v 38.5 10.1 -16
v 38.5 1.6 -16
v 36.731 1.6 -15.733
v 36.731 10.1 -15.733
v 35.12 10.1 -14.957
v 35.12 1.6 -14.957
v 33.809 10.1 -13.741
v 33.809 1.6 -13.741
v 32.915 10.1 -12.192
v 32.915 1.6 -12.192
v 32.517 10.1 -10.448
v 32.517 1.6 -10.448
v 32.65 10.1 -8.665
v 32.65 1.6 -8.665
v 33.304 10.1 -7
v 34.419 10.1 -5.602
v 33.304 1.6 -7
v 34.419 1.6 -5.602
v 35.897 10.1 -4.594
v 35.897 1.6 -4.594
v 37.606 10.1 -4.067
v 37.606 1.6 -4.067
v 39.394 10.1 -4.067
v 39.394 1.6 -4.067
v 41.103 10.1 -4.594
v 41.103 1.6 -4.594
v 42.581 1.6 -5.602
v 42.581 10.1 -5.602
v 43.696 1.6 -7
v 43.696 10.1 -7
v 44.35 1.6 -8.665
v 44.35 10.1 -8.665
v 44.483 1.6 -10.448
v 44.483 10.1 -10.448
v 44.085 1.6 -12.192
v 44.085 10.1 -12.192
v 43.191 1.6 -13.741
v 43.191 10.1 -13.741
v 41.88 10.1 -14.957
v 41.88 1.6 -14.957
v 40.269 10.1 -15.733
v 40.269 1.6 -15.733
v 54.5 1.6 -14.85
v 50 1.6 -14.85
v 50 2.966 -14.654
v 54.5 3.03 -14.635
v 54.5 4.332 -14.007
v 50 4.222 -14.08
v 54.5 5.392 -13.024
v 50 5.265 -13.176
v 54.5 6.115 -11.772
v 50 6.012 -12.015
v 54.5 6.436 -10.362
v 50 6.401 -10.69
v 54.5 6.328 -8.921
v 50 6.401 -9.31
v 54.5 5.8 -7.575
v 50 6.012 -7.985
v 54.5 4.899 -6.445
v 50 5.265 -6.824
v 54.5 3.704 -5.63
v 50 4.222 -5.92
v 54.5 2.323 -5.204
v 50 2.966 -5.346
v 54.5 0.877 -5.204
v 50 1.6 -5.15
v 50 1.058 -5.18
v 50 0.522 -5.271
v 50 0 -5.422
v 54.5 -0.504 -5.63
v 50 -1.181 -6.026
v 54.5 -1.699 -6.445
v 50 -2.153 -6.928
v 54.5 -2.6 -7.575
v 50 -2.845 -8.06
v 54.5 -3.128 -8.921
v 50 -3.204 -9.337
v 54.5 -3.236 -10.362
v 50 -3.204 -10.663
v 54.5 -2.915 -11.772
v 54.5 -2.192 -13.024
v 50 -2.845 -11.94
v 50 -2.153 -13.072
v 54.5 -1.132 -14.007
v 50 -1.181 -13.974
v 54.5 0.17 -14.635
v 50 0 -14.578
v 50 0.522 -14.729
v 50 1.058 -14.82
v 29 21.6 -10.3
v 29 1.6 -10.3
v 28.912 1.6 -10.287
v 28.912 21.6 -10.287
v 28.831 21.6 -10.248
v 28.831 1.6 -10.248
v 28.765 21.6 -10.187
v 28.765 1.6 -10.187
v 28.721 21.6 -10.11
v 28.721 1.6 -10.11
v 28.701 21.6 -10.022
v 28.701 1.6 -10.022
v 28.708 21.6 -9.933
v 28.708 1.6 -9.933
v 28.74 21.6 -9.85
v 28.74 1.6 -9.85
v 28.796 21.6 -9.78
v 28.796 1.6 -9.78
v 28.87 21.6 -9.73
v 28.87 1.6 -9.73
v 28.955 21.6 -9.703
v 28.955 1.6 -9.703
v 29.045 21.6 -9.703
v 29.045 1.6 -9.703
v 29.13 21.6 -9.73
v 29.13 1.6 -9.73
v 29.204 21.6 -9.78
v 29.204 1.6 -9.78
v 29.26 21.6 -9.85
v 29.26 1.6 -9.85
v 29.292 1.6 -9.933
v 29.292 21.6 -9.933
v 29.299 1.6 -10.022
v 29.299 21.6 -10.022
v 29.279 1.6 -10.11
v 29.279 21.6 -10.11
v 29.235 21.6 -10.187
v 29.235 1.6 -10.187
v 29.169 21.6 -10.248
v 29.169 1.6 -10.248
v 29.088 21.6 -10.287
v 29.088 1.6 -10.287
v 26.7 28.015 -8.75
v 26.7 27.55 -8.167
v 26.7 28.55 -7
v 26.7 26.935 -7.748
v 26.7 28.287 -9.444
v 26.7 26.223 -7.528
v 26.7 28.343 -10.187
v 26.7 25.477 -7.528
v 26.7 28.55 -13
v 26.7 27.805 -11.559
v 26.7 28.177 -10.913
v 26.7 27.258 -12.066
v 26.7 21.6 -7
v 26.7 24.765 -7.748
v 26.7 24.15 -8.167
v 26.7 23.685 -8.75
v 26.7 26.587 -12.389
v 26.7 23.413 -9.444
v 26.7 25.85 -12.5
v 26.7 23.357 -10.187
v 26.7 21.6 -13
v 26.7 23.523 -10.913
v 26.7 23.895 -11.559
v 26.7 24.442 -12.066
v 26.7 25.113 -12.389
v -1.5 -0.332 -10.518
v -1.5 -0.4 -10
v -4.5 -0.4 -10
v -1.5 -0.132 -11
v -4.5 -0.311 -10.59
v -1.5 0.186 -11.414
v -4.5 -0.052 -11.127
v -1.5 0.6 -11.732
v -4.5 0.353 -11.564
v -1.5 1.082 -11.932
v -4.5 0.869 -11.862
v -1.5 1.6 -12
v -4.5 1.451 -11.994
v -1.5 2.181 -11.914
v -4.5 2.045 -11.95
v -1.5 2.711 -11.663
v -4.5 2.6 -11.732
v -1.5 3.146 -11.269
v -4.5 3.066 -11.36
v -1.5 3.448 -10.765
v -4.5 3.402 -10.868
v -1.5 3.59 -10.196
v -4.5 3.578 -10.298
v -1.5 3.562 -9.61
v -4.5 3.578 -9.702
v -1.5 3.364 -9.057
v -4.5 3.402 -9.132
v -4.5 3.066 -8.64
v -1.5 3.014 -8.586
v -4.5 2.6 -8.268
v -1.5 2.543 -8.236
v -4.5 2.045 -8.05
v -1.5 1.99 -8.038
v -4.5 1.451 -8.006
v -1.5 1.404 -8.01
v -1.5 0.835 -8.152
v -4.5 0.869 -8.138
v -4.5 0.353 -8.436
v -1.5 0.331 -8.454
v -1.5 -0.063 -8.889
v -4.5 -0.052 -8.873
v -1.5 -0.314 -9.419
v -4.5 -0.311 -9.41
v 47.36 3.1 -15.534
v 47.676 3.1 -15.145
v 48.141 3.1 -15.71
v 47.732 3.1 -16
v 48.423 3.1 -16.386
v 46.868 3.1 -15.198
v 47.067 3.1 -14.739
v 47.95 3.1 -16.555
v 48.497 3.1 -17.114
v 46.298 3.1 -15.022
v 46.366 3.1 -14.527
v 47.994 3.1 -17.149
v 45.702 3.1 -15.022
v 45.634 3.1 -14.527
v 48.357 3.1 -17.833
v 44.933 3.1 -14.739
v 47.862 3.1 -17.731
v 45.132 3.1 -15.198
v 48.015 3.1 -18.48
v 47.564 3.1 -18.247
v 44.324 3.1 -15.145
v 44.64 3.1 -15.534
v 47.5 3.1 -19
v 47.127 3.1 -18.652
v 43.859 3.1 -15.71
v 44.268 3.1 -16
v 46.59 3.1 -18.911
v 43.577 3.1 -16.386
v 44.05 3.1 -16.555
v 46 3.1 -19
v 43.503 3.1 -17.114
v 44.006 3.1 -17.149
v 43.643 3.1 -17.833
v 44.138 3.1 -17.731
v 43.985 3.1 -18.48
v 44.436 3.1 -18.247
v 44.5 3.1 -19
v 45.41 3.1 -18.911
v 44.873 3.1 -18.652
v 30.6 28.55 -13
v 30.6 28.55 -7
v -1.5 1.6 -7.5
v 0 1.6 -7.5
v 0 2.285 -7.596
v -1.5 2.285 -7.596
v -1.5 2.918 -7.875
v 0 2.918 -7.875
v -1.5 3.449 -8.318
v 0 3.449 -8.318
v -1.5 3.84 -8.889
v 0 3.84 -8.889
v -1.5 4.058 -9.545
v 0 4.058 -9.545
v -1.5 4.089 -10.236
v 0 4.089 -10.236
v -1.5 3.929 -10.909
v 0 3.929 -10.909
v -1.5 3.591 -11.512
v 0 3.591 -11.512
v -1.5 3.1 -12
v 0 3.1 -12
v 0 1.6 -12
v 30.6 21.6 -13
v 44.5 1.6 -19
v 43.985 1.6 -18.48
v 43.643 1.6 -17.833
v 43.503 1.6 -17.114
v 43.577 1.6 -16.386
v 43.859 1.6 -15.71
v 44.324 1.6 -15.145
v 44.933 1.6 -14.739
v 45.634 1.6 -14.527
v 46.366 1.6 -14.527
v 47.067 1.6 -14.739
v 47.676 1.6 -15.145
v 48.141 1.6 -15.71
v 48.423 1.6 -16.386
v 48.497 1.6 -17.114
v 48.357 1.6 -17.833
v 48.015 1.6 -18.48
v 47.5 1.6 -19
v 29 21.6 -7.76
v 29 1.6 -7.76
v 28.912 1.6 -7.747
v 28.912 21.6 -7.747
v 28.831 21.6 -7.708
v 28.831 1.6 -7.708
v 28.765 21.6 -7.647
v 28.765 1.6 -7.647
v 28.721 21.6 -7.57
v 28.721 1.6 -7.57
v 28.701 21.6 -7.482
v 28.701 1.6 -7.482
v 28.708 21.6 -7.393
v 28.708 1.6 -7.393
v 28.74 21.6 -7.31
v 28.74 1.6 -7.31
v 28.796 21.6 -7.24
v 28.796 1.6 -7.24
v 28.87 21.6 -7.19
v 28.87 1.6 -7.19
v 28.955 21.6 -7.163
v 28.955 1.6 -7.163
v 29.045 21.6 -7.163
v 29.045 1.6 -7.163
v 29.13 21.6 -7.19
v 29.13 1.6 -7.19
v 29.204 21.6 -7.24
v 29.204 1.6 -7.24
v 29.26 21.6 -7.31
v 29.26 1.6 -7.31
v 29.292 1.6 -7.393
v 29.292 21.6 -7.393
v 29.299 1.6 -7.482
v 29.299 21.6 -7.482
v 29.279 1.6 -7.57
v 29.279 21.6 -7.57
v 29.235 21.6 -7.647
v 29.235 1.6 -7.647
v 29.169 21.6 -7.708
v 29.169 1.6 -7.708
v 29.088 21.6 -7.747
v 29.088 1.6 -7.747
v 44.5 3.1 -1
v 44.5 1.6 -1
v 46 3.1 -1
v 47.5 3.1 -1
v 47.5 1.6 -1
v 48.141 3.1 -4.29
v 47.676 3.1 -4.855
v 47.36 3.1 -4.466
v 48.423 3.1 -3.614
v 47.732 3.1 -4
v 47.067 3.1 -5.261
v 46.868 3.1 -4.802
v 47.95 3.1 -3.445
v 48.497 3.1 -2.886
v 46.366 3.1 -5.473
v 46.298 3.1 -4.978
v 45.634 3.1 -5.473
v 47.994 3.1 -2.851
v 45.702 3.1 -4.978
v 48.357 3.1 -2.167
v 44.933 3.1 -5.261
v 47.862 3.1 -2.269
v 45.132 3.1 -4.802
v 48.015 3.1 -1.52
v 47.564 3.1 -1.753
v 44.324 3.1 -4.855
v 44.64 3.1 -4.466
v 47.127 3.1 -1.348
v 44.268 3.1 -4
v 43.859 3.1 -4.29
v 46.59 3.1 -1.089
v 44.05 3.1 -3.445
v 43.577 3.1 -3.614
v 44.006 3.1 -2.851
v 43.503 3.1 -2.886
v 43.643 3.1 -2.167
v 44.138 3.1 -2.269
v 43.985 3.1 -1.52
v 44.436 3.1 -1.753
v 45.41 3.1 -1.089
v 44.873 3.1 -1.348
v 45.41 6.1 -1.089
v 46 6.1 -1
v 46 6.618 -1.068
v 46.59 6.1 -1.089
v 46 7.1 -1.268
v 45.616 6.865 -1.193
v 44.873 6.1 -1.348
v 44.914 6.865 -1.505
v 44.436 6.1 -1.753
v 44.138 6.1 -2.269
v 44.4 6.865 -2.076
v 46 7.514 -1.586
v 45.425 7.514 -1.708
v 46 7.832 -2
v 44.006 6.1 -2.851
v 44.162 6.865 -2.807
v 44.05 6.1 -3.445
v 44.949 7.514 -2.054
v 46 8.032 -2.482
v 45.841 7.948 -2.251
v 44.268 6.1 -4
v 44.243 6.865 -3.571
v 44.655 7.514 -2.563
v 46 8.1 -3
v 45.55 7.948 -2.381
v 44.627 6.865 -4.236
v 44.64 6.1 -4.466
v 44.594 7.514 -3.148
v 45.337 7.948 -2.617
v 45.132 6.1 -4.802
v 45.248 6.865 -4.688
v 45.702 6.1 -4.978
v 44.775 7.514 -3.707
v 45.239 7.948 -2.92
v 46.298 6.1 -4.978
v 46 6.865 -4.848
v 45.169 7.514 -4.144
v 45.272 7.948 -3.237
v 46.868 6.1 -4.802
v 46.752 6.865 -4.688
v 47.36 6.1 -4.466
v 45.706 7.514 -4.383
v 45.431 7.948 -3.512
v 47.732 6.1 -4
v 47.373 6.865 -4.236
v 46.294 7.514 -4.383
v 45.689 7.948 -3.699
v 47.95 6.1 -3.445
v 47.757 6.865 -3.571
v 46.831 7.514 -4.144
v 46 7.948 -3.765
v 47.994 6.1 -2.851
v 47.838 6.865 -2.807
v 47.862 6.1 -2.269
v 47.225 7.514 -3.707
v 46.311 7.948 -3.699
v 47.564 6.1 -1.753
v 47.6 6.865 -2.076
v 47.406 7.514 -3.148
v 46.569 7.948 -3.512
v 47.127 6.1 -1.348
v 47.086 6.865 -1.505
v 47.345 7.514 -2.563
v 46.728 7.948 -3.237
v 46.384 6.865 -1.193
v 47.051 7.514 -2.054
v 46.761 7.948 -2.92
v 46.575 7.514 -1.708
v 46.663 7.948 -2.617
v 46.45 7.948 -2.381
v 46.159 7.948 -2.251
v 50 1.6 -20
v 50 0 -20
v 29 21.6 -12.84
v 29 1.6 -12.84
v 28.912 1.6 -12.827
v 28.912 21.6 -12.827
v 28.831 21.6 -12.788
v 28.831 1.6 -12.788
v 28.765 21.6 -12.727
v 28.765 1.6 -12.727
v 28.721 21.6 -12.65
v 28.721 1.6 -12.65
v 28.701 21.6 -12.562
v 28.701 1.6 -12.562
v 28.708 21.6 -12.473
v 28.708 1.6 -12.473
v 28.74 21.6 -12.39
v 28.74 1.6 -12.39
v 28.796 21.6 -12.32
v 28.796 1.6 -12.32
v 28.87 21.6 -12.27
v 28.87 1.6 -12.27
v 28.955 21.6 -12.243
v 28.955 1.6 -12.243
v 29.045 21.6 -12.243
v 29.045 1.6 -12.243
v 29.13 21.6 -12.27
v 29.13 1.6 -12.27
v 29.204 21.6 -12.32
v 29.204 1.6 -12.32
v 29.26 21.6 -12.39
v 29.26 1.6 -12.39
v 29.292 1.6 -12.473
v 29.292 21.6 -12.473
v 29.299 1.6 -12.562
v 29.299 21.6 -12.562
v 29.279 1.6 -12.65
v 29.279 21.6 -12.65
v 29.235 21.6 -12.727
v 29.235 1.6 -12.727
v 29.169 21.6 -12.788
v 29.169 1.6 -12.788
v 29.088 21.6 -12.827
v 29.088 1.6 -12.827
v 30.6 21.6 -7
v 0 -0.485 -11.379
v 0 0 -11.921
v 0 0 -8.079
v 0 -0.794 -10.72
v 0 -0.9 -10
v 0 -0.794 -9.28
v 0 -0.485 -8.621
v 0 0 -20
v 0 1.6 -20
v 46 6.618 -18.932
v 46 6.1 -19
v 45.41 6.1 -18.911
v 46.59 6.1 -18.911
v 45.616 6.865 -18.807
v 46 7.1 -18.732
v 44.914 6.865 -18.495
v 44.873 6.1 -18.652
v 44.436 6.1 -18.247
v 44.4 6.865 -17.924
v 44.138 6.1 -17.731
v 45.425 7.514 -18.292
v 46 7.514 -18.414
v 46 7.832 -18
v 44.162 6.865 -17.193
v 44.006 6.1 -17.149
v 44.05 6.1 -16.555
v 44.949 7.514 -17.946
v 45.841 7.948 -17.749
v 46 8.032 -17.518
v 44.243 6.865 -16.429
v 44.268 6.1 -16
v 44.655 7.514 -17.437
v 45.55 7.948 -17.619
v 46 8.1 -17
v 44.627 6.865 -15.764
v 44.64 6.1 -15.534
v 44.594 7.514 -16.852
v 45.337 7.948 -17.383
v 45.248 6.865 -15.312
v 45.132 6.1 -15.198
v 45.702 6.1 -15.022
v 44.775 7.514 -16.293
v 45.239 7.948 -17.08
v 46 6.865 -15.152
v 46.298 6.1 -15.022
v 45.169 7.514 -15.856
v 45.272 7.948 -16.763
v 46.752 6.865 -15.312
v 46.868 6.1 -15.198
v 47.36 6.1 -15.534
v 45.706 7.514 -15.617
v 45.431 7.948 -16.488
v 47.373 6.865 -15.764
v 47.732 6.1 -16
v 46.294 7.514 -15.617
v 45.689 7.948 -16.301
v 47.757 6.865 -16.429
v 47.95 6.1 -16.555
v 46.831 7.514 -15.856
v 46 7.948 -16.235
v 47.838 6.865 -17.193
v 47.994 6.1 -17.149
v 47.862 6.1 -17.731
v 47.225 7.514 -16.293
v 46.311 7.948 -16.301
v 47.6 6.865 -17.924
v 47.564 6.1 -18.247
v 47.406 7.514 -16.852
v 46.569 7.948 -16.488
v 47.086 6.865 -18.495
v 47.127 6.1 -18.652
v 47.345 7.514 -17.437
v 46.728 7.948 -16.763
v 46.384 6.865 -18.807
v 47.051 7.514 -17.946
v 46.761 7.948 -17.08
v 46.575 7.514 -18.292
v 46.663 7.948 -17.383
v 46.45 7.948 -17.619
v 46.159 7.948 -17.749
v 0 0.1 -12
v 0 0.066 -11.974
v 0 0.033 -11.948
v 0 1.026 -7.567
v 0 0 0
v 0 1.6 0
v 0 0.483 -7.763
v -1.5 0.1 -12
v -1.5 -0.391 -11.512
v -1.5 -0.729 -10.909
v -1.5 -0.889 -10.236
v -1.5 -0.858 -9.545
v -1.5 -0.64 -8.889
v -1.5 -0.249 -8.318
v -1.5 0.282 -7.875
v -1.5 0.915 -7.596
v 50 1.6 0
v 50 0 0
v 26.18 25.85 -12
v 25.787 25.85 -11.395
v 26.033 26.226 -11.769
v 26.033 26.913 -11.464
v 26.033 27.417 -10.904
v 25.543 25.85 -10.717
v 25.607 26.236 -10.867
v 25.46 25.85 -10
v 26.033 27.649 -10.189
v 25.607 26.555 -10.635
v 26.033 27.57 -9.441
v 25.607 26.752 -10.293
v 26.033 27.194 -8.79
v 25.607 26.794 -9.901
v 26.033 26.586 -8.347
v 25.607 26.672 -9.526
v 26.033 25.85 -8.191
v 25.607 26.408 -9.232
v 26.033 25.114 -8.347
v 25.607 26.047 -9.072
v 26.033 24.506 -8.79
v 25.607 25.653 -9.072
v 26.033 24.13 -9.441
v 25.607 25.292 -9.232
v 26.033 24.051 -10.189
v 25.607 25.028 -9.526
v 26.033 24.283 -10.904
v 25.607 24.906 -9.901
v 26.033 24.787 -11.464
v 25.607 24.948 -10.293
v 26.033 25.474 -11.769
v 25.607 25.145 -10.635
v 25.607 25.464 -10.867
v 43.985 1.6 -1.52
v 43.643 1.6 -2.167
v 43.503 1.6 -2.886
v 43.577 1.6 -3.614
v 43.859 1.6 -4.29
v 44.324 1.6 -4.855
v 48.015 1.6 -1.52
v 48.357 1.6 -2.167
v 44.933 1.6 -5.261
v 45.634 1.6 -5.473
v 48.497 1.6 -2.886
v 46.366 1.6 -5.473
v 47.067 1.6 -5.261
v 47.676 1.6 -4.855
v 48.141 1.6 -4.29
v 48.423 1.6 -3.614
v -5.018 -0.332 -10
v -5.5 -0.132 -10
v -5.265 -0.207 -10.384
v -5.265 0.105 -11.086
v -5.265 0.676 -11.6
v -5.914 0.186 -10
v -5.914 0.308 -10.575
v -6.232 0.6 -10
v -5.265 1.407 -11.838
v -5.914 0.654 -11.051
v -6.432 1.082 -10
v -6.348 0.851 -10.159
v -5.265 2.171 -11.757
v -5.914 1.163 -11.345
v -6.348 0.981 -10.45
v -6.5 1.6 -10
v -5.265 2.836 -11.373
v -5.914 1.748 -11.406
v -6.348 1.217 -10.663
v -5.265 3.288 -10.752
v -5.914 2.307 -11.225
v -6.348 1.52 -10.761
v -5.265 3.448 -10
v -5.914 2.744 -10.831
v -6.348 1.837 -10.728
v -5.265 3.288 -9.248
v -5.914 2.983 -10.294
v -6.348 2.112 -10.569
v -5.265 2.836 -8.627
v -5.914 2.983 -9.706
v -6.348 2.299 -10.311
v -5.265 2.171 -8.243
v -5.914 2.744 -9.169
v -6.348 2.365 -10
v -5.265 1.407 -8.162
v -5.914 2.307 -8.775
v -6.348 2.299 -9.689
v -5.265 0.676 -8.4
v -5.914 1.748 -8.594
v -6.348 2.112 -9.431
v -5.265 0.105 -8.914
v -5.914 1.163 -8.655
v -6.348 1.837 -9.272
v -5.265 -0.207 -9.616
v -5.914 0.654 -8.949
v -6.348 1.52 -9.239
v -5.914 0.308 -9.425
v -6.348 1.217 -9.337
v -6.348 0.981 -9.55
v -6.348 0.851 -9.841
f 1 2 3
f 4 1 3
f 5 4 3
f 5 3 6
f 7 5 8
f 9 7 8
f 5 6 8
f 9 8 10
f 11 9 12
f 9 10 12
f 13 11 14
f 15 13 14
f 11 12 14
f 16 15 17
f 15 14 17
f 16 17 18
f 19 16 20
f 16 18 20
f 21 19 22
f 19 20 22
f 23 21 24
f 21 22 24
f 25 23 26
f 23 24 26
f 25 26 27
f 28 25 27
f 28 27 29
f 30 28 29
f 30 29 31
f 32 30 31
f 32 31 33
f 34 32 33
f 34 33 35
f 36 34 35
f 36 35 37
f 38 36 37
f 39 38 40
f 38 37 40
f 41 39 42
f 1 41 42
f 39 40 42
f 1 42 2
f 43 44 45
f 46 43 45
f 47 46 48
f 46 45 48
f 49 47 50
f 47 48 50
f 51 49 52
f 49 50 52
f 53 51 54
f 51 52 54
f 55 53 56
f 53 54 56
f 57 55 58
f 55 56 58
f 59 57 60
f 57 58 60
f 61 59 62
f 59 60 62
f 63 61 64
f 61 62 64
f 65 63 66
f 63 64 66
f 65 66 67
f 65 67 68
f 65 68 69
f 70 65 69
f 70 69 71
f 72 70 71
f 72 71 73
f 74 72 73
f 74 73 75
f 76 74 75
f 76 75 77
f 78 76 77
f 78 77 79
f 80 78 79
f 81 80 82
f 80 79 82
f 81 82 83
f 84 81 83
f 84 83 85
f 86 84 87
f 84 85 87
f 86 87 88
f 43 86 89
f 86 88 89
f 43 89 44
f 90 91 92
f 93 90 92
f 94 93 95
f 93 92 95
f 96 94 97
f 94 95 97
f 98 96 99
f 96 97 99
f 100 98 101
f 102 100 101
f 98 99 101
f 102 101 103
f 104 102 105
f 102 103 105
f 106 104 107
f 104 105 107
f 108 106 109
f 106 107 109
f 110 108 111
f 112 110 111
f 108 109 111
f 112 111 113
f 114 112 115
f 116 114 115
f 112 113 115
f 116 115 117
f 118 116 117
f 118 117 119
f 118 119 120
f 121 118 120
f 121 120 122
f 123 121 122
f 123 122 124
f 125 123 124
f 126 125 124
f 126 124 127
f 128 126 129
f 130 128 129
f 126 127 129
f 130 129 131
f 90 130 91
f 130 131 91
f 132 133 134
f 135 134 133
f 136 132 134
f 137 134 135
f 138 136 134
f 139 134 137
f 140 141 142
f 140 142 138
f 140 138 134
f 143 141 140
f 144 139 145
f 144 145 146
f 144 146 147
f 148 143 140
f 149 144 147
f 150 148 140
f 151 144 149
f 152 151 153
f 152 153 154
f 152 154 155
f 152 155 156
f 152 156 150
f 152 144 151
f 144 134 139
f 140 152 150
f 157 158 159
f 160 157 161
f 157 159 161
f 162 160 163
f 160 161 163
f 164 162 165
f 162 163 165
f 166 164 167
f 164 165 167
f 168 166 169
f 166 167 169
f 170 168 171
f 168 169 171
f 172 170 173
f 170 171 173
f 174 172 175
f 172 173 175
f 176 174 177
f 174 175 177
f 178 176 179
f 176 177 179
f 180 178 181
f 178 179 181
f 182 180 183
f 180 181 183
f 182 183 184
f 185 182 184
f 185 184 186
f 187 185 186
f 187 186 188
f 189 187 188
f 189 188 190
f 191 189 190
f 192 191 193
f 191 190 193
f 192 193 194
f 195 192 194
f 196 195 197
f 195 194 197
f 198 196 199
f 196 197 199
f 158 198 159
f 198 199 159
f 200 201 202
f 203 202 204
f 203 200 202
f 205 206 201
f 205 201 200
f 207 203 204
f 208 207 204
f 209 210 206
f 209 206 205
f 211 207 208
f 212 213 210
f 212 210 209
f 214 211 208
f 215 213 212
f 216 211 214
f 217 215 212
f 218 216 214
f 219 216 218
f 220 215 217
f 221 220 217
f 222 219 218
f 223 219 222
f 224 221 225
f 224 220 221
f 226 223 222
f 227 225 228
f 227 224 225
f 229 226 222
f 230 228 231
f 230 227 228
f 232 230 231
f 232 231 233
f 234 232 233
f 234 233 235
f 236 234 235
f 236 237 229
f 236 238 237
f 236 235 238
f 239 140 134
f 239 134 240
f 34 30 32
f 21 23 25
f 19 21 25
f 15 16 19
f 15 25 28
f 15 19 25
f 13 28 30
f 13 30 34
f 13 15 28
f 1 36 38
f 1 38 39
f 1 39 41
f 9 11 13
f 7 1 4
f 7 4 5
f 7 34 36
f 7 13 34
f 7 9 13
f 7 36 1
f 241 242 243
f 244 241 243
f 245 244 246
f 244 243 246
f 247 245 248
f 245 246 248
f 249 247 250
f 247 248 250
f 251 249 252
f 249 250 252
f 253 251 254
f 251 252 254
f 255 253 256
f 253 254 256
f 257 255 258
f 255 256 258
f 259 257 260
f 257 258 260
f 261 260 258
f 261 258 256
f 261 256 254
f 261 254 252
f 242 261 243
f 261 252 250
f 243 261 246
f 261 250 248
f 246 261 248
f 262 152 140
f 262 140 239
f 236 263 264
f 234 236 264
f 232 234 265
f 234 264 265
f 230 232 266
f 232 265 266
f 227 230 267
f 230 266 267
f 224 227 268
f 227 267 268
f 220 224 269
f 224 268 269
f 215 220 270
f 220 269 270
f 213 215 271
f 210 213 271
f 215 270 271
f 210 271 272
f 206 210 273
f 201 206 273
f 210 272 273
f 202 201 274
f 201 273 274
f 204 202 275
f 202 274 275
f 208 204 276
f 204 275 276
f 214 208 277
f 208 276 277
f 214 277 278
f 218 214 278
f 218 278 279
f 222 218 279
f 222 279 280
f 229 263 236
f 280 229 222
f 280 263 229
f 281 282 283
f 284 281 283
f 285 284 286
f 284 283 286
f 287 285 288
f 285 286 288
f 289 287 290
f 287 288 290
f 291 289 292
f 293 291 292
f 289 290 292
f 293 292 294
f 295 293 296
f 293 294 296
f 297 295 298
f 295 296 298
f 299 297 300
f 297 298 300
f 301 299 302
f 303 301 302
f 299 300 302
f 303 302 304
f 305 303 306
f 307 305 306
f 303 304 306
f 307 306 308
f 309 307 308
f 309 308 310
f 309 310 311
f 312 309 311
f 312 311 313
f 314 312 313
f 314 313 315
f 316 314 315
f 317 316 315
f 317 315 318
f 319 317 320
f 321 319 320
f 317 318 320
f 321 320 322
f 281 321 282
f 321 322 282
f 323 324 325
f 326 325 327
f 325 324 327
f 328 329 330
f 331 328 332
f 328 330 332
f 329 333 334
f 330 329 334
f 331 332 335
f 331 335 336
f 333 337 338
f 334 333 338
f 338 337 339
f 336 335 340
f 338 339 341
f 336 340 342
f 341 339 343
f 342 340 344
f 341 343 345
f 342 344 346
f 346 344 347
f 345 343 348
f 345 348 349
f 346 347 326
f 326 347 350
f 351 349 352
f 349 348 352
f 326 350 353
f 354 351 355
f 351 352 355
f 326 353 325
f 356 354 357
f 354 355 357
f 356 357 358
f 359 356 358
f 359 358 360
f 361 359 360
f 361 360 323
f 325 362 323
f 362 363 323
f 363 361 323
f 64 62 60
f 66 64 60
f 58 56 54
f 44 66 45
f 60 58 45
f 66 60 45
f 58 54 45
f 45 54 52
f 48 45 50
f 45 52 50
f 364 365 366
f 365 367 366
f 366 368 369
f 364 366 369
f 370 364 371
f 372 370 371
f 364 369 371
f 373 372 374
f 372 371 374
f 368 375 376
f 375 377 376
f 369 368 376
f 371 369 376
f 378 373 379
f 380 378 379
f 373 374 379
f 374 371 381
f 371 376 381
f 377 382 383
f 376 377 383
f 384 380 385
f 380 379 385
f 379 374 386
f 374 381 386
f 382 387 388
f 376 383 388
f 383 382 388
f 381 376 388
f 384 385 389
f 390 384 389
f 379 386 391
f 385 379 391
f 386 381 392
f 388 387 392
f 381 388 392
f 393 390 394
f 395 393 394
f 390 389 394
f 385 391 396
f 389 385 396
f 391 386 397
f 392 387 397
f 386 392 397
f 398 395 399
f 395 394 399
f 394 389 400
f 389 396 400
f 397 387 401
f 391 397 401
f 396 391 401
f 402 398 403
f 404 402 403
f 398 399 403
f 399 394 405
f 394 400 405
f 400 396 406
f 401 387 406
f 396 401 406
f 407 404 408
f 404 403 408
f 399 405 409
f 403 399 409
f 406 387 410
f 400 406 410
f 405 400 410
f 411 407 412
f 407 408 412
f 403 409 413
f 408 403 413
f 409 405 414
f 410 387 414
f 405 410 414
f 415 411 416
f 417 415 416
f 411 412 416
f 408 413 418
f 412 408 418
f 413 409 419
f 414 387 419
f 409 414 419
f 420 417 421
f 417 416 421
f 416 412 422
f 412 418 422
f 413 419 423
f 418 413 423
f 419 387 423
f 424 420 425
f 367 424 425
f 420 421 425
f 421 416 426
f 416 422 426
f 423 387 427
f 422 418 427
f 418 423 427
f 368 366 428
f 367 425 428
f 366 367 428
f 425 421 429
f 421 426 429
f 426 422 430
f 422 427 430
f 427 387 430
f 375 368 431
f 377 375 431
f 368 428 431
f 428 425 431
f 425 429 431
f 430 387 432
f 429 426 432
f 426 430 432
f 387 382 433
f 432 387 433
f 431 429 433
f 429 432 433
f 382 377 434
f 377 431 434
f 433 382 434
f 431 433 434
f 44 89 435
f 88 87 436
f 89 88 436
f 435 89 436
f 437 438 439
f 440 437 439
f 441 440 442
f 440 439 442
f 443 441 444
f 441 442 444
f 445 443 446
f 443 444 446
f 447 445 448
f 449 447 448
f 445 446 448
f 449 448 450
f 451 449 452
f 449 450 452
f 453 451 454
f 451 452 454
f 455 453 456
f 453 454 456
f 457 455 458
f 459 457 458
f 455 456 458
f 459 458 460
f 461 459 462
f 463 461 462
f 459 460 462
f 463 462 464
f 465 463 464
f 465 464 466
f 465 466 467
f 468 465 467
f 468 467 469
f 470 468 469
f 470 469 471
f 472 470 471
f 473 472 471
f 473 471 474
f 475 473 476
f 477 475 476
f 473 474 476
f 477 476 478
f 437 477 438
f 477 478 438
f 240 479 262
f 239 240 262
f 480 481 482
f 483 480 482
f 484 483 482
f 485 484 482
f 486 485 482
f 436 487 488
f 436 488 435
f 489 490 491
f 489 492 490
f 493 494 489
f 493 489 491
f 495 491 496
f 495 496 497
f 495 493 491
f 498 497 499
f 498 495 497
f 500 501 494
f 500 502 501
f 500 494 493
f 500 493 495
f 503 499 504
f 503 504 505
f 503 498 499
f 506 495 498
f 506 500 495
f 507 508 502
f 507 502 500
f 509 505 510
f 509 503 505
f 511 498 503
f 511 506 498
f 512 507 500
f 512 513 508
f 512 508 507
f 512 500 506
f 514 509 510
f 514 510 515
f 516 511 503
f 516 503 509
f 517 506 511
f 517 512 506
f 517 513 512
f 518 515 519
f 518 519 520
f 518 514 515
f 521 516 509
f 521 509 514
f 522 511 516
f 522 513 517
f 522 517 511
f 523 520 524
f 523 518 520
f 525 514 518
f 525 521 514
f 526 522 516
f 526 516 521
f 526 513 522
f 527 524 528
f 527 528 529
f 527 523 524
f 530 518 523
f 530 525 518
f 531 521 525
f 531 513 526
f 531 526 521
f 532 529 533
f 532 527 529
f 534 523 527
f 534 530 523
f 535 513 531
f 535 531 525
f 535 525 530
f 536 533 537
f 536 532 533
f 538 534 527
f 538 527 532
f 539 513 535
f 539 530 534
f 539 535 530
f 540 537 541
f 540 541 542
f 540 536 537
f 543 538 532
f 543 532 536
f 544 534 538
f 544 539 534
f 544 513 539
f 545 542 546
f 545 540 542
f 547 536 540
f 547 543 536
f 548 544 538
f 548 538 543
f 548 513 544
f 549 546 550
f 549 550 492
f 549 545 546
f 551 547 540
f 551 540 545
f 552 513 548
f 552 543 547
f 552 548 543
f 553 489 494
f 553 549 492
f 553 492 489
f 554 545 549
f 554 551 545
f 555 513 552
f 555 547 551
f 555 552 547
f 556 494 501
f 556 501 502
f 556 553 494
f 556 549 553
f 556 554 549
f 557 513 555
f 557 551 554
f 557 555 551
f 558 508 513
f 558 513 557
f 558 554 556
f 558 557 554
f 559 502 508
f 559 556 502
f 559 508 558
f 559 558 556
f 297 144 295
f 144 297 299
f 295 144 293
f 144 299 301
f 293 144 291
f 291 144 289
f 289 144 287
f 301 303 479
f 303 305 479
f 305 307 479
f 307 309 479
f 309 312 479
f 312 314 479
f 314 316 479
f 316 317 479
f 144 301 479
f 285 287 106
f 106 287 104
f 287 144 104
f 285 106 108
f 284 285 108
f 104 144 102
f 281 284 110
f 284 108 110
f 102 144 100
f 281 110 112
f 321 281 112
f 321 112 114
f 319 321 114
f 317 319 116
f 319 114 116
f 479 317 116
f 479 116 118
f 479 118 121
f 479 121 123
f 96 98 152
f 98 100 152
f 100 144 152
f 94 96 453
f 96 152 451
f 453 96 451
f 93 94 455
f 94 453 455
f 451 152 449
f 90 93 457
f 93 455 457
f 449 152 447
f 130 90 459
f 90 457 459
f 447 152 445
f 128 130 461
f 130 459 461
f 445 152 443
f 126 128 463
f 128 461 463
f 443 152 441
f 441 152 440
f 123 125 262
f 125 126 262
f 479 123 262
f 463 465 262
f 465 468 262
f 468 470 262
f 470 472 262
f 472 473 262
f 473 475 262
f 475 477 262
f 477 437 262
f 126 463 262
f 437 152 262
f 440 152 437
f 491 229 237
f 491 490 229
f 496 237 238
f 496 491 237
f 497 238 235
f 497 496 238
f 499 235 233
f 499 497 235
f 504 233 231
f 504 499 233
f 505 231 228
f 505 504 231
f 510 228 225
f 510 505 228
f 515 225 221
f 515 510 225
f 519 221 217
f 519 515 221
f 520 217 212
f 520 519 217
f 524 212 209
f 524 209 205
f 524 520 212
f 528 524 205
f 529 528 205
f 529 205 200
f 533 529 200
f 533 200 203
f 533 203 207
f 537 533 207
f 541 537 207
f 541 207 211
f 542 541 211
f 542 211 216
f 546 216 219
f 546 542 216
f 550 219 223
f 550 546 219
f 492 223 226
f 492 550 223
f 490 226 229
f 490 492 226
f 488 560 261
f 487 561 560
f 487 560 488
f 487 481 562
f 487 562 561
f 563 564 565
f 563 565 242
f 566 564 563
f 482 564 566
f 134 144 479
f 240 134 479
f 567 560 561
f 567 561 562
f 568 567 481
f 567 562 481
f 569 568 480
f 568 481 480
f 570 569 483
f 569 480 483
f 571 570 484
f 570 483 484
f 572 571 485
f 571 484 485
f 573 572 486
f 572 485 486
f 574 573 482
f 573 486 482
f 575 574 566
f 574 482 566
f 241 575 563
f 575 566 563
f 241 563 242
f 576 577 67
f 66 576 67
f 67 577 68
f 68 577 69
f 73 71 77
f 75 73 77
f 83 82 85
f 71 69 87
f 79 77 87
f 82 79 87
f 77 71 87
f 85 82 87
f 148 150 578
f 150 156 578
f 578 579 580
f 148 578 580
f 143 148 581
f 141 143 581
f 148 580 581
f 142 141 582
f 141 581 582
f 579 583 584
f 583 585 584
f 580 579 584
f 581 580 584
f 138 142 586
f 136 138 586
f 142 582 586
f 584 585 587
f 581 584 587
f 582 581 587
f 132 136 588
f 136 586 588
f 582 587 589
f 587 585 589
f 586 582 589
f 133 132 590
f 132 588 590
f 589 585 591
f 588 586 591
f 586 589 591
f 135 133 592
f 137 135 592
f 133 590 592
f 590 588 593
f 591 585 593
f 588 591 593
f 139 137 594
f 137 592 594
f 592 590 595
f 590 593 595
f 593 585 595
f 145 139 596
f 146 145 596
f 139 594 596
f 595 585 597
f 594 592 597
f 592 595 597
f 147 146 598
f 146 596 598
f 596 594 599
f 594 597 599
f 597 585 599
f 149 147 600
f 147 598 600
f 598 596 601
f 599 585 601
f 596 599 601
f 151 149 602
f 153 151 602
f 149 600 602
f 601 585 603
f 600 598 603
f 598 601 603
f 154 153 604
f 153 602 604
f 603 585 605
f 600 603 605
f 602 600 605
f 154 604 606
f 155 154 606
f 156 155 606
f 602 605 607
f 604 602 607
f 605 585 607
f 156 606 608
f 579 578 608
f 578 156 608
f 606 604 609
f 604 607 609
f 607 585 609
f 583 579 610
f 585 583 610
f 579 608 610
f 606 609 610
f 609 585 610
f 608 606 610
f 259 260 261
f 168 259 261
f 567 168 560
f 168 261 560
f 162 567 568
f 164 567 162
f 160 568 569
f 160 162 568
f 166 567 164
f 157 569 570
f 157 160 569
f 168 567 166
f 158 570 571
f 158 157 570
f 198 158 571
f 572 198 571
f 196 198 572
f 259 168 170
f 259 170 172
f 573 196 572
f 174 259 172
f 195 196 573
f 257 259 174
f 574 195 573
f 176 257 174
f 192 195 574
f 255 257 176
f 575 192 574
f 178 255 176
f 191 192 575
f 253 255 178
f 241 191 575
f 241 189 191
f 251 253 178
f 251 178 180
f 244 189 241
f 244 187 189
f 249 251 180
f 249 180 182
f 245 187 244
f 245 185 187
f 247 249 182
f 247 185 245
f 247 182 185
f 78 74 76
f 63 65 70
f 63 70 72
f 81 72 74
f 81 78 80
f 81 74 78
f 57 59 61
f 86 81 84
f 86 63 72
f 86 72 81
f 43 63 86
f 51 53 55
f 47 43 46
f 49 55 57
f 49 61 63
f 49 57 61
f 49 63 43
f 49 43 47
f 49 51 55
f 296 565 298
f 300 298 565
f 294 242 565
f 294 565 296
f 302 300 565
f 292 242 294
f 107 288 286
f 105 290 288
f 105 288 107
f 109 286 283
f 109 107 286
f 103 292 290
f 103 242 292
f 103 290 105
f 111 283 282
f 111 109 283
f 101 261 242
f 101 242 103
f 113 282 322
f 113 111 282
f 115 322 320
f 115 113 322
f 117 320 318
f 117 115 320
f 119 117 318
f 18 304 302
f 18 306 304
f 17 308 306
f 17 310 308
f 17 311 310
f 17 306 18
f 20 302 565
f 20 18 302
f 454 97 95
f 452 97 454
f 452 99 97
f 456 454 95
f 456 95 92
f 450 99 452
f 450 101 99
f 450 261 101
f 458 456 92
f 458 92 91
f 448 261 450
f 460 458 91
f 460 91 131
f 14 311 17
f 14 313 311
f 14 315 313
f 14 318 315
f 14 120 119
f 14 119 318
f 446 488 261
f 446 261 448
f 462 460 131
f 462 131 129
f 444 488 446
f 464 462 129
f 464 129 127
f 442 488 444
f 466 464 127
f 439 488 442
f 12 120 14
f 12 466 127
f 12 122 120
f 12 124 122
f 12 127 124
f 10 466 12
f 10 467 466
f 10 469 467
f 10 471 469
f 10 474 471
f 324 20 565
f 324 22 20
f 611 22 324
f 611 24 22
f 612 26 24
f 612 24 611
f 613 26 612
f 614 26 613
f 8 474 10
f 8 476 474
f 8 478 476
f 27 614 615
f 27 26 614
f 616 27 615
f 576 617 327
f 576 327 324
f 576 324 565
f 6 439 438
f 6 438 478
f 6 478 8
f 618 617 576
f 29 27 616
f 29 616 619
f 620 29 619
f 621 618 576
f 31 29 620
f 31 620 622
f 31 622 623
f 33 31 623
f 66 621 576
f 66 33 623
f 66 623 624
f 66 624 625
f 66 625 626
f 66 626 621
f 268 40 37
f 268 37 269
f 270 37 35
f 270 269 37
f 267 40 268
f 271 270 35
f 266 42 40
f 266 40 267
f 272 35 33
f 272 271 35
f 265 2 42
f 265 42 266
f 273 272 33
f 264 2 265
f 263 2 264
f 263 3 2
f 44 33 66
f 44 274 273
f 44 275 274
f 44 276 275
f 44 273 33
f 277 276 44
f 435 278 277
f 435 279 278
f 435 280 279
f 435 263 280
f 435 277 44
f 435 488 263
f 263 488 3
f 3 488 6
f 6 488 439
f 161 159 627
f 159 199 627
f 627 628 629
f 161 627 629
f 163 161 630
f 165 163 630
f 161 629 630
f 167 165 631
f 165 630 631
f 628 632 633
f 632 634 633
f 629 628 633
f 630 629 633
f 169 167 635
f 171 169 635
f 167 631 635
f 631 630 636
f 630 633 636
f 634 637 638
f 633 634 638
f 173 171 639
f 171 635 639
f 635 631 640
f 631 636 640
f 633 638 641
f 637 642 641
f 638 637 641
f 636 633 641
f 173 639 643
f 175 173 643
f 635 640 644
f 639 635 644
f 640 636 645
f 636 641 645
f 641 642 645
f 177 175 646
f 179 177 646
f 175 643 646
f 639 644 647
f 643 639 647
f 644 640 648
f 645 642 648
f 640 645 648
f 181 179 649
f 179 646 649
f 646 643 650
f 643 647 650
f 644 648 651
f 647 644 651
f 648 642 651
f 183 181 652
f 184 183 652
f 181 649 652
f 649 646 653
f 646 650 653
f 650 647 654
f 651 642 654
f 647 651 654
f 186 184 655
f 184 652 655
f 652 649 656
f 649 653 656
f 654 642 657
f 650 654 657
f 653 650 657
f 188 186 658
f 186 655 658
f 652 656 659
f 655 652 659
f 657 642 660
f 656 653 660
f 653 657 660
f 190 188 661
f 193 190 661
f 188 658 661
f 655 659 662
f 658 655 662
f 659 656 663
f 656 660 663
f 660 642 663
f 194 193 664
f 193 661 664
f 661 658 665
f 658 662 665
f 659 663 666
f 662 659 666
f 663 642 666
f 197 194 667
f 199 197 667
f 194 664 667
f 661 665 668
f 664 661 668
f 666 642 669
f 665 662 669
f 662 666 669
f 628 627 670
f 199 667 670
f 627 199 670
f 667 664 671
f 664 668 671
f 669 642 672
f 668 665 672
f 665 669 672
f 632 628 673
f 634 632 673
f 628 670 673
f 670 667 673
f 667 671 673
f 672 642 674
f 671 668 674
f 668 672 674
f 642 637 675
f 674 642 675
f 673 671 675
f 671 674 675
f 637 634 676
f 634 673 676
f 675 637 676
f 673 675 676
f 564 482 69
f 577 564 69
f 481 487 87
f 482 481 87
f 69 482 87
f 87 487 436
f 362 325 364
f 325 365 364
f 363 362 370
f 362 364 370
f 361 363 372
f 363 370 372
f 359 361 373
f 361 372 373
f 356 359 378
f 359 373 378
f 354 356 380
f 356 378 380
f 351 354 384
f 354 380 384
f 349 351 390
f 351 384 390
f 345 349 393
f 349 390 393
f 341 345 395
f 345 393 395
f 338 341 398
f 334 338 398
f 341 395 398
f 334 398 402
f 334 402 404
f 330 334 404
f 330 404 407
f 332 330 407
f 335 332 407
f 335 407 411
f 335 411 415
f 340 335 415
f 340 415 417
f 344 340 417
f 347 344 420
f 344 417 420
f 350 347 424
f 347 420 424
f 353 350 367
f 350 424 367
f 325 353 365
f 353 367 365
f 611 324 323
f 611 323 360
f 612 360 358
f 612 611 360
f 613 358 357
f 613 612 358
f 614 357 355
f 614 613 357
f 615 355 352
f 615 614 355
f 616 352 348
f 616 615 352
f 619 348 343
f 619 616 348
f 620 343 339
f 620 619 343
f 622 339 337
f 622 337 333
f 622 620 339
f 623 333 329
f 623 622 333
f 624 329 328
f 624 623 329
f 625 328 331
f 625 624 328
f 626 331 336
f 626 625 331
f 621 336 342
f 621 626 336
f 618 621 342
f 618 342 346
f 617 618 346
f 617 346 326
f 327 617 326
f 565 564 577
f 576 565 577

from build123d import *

# Parameters (mm, degrees)
SKETCH1_W           = 50
SKETCH1_H           = 20
BOSS_EXTRUDE1_DEPTH = 1.6
SKETCH2_R           = 0.3
BOSS_EXTRUDE2_DEPTH = 20
SKETCH3_W           = 3.9
SKETCH3_H           = 6
BOSS_EXTRUDE3_DEPTH = 6.95
SKETCH6_R           = 6
BOSS_EXTRUDE4_DEPTH = 8.5
SKETCH7_R           = 4.85
BOSS_EXTRUDE5_DEPTH = 4.5
SKETCH8_R           = 2.5
BOSS_EXTRUDE6_DEPTH = 1.5
CUT_EXTRUDE1_REACH  = 66.004
BOSS_EXTRUDE7_DEPTH = 1.5


with BuildPart() as part:
    # Sketch1 → Boss-Extrude1 (new body)
    with BuildSketch(Plane(origin=(0, 0, 0), x_dir=(1, 0, 0), z_dir=(0, 1, 0))):
        with Locations((25, 10)):
            Rectangle(SKETCH1_W, SKETCH1_H)
    extrude(amount=BOSS_EXTRUDE1_DEPTH)

    # Sketch2 → Boss-Extrude2 (add)
    with BuildSketch(Plane(origin=(0, 1.6, 0), x_dir=(1, 0, 0), z_dir=(0, 1, 0))):
        with Locations(Location((29, 12.54, 0), (0, 0, 90))):
            Circle(SKETCH2_R)
        with Locations(Location((29, 10, 0), (0, 0, 90))):
            Circle(SKETCH2_R)
        with Locations(Location((29, 7.46, 0), (0, 0, 90))):
            Circle(SKETCH2_R)
    extrude(amount=BOSS_EXTRUDE2_DEPTH)

    # Sketch3 → Boss-Extrude3 (add)
    with BuildSketch(Plane(origin=(0, 21.6, 0), x_dir=(1, 0, 0), z_dir=(0, 1, 0))):
        with Locations((28.65, 10)):
            Rectangle(SKETCH3_W, SKETCH3_H)
    extrude(amount=BOSS_EXTRUDE3_DEPTH)

    # Sketch5 → Revolve1 (revolve)
    with BuildSketch(Plane(origin=(0, 25.85, 0), x_dir=(1, 0, 0), z_dir=(0, 1, 0))):
        with BuildLine():
            Line((26.7, 10), (26.7, 12.5))
            ThreePointArc((26.7, 12.5), (25.786983735, 11.395327736), (25.459936306, 10))
            Line((25.459936306, 10), (26.7, 10))
        make_face()
    revolve(axis=Axis((25.459936306, 25.85, -10), (1, 0, 0)))

    # Sketch6 → Boss-Extrude4 (add)
    with BuildSketch(Plane(origin=(0, 1.6, 0), x_dir=(1, 0, 0), z_dir=(0, 1, 0))):
        with Locations(Location((38.5, 10, 0), (0, 0, 90))):
            Circle(SKETCH6_R)
    extrude(amount=BOSS_EXTRUDE4_DEPTH)

    # Sketch7 → Boss-Extrude5 (add)
    with BuildSketch(Plane(origin=(50, 0, 0), x_dir=(0, 0, -1), z_dir=(1, 0, 0))):
        with Locations((10, 1.6)):
            Circle(SKETCH7_R)
    extrude(amount=BOSS_EXTRUDE5_DEPTH)

    # Sketch8 → Boss-Extrude6 (add)
    with BuildSketch(Plane(origin=(0, 1.6, 0), x_dir=(1, 0, 0), z_dir=(0, 1, 0))):
        with Locations(Location((46, 17, 0), (0, 0, 90))):
            Circle(SKETCH8_R)
    boss_extrude6 = extrude(amount=BOSS_EXTRUDE6_DEPTH)

    # Sketch10 → Revolve2 (revolve)
    with BuildSketch(Plane(origin=(46, 0, 0), x_dir=(0, 0, -1), z_dir=(1, 0, 0))):
        with BuildLine():
            Line((19, 3.1), (19, 6.1))
            ThreePointArc((19, 6.1), (18.414213562, 7.514213562), (17, 8.1))
            Line((17, 8.1), (17, 3.1))
            Line((17, 3.1), (19, 3.1))
        make_face()
    revolve2 = revolve(axis=Axis((46, 3.1, -17), (0, 1, 0)))

    # Sketch11 → Cut-Extrude1 (cut, up to next)
    with BuildSketch(Plane(origin=(0, 1.6, 0), x_dir=(1, 0, 0), z_dir=(0, 1, 0)), mode=Mode.PRIVATE) as cut_extrude1_sk1:
        with BuildLine():
            Line((44.5, 19), (47.5, 19))
            ThreePointArc((47.5, 19), (46, 19.5), (44.5, 19))
        make_face()
    cut_extrude1_tool1 = extrude(cut_extrude1_sk1.sketch, amount=CUT_EXTRUDE1_REACH, mode=Mode.PRIVATE) & part.part
    cut_extrude1 = cut_extrude1_tool1.solids().sort_by_distance((46, 1.6, -19.20182))[0]
    add(cut_extrude1, mode=Mode.SUBTRACT)

    # Mirror1: Boss-Extrude6, Revolve2, Cut-Extrude1 across plane
    add(boss_extrude6.mirror(Plane.XY.offset(-10)))
    add(revolve2.mirror(Plane.XY.offset(-10)))
    add(cut_extrude1.mirror(Plane.XY.offset(-10)), mode=Mode.SUBTRACT)

    # Sketch12 → Boss-Extrude7 (add)
    with BuildSketch(Plane.ZY):
        with BuildLine():
            ThreePointArc((-7.5, 1.6), (-9.209430585, 3.971708245), (-12, 3.1))
            Line((-12, 3.1), (-12, 0.1))
            ThreePointArc((-12, 0.1), (-9.209430585, -0.771708245), (-7.5, 1.6))
        make_face()
    extrude(amount=BOSS_EXTRUDE7_DEPTH)

    # Sketch14 → Revolve3 (revolve)
    with BuildSketch(Plane.XY.offset(-10), mode=Mode.PRIVATE) as revolve3_sk:
        with BuildLine():
            Line((-1.5, 3.6), (-4.5, 3.6))
            ThreePointArc((-4.5, 3.6), (-5.914213562, 3.014213562), (-6.5, 1.6))
            Line((-6.5, 1.6), (-1.5, 1.6))
            Line((-1.5, 1.6), (-1.5, 3.6))
        make_face()
    revolve(revolve3_sk.sketch.rotate(Axis((-6.5, 1.6, -10), (1, 0, 0)), 180), axis=Axis((-6.5, 1.6, -10), (1, 0, 0)))


solid = part.part
